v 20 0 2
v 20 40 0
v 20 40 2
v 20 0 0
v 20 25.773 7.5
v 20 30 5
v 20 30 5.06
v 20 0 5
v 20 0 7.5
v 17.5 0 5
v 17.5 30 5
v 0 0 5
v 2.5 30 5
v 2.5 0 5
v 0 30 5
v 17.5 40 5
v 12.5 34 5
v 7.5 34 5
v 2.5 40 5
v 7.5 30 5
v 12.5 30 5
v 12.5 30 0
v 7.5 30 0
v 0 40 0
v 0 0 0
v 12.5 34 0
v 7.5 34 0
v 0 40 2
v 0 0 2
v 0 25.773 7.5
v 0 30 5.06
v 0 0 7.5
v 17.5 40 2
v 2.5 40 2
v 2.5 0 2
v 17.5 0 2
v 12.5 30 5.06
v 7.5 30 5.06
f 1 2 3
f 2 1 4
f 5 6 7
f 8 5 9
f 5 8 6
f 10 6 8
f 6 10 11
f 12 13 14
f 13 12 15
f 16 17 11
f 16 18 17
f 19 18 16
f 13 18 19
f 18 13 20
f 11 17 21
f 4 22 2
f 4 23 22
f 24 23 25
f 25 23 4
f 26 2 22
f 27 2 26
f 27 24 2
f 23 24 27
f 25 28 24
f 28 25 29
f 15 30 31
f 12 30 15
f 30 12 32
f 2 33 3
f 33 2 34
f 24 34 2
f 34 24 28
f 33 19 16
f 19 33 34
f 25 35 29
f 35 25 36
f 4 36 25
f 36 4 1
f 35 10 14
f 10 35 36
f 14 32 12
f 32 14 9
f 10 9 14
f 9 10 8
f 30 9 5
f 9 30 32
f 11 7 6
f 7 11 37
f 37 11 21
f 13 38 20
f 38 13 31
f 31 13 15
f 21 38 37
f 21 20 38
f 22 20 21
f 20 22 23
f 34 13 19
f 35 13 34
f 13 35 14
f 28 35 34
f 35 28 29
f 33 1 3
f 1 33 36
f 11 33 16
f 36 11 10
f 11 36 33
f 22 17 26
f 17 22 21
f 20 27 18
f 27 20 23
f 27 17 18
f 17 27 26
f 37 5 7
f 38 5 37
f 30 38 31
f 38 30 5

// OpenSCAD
// file: mountBase.scad
/*
* Object: Bicycle headlight mount
* Creator: Patrick Ma
* Date started: 5/33/2014
* Date completed: 
* This is only the lower half of the bracket
*/


// global variables

baseW = 20; // x-axis
baseL = 40; // y-axis
baseH = 5; // z-axis
baseTang = 15; // W of center ridge
lipH = 2; 
totalH = 1.5*baseH;// The total height of the base bracket

// locking hole
lockW = 5;	
lockL = 4;


/*
 * creates the section of the bracket that insets into the mounting bracket on
 * the bike.
 */
module mountBase() {
	slotW = (baseW - baseTang) /2;	// calculate the depth of the retaining slot
	difference(){

		// add these
		union() {
			cube([baseW, baseL, baseH]); // bottom
			translate([0,0,baseH]) 
				cube([baseW, 0.75*baseL, baseH/2]); // top
		}

		// subtract these
		union() {
			// create the slots
			for (i = [0,1]) {
#translate([(0.1)*(i-1) + i*(baseTang + slotW), -0.25, 2]) 
				cube([ slotW+0.1, baseL + 0.5, baseH - lipH]);
			}

			// create the locking hole
# translate([(baseW - lockW)/2, 30, -0.1])
			cube([lockW, lockL, totalH + 0.2]); 

			// bevel front of top
#translate([baseW/2, 0.75*baseL-1.4, 1.5*baseH+0.1]) 
			rotate([0, 90, 0]) rotate(60)
				cube([5, 3, baseW+0.1], center=true);

		}
	}
}

mountBase();
//translate([baseW /2, 7, totalH]) lowerBracket(25);
// main file
/*
 * Object: lower bracket for bike headlight mount
 * Creator: Patrick Ma
 * Date started: 5/13/2014
 * Date completed: 
 * This is only the lower half of the bracket
 */

include <mountBase.scad>

/* 
 * Creates the lower bracket for the light proper
 * ID: inner diameter of bracket -- aka the outer dia of the light
 */
module lowerBracket(ID, lower){
	verticalOffset = 1.0*(ID-5);
	outerWidth = ID + 2*(3.65 + 4.3 + 3.65);	// the outer width is the ID + 2*(3.65mm + 4.3 + 3.65mm)
screwCenter = ID/2 + 3.65 + 4.3/2;	// = inner radius + offset + screw dia /2

	translate([0, 0, verticalOffset])
		difference() {
			// Adds
			union() {	
				resize([outerWidth, 20, ID + 10]) sphere(10); // forms the bracket body
				translate([-0.5*baseW, -7, -1*(ID-5)]) // attach to mountBase
					cube([baseW, 20, 10]);
			}

			// subtracts
			union() {
*				translate([0, 50, 0])cube(100, center=true); // for cross-section

				rotate([90, 0, 0])
					cylinder(h=2* ID, r=ID/2, center=true);	// hole for light

				translate([0, 18.5, 14.5-ID]) 
					rotate([0,90,0]) 
					cylinder(h=baseW+0.1, r=11, center=true);	// curve the front

				// On both side
				for(i =[-1,1])
				{
					// captured nut
					translate([i * screwCenter, 0, -10])
						rotate([180,0,0])
						cylinder(d=7.61, $fn=6, h=10, center=true);

					// screw hole
					translate([i*screwCenter, 0, -20])cylinder(d=4.3, h=40, $fn=20);

					// Countersunk bolt head
					translate([i*screwCenter, 0, 10])cylinder(d=7, h = 10, $fn=20, center=true);
				}

				// separate the top and bottom bracket
				cube ([100, ID + 20, 1], center=true);

				// top or bottom of bracket?
				if (lower) {
					translate([-50, -50, 0])cube(100);
				} else {
					rotate([180,0,0])translate([-50, -50, 0])cube(100);
				}
			}
		}
}

//// an example
//lowerBracket(25, true);
//lowerBracket(25);
